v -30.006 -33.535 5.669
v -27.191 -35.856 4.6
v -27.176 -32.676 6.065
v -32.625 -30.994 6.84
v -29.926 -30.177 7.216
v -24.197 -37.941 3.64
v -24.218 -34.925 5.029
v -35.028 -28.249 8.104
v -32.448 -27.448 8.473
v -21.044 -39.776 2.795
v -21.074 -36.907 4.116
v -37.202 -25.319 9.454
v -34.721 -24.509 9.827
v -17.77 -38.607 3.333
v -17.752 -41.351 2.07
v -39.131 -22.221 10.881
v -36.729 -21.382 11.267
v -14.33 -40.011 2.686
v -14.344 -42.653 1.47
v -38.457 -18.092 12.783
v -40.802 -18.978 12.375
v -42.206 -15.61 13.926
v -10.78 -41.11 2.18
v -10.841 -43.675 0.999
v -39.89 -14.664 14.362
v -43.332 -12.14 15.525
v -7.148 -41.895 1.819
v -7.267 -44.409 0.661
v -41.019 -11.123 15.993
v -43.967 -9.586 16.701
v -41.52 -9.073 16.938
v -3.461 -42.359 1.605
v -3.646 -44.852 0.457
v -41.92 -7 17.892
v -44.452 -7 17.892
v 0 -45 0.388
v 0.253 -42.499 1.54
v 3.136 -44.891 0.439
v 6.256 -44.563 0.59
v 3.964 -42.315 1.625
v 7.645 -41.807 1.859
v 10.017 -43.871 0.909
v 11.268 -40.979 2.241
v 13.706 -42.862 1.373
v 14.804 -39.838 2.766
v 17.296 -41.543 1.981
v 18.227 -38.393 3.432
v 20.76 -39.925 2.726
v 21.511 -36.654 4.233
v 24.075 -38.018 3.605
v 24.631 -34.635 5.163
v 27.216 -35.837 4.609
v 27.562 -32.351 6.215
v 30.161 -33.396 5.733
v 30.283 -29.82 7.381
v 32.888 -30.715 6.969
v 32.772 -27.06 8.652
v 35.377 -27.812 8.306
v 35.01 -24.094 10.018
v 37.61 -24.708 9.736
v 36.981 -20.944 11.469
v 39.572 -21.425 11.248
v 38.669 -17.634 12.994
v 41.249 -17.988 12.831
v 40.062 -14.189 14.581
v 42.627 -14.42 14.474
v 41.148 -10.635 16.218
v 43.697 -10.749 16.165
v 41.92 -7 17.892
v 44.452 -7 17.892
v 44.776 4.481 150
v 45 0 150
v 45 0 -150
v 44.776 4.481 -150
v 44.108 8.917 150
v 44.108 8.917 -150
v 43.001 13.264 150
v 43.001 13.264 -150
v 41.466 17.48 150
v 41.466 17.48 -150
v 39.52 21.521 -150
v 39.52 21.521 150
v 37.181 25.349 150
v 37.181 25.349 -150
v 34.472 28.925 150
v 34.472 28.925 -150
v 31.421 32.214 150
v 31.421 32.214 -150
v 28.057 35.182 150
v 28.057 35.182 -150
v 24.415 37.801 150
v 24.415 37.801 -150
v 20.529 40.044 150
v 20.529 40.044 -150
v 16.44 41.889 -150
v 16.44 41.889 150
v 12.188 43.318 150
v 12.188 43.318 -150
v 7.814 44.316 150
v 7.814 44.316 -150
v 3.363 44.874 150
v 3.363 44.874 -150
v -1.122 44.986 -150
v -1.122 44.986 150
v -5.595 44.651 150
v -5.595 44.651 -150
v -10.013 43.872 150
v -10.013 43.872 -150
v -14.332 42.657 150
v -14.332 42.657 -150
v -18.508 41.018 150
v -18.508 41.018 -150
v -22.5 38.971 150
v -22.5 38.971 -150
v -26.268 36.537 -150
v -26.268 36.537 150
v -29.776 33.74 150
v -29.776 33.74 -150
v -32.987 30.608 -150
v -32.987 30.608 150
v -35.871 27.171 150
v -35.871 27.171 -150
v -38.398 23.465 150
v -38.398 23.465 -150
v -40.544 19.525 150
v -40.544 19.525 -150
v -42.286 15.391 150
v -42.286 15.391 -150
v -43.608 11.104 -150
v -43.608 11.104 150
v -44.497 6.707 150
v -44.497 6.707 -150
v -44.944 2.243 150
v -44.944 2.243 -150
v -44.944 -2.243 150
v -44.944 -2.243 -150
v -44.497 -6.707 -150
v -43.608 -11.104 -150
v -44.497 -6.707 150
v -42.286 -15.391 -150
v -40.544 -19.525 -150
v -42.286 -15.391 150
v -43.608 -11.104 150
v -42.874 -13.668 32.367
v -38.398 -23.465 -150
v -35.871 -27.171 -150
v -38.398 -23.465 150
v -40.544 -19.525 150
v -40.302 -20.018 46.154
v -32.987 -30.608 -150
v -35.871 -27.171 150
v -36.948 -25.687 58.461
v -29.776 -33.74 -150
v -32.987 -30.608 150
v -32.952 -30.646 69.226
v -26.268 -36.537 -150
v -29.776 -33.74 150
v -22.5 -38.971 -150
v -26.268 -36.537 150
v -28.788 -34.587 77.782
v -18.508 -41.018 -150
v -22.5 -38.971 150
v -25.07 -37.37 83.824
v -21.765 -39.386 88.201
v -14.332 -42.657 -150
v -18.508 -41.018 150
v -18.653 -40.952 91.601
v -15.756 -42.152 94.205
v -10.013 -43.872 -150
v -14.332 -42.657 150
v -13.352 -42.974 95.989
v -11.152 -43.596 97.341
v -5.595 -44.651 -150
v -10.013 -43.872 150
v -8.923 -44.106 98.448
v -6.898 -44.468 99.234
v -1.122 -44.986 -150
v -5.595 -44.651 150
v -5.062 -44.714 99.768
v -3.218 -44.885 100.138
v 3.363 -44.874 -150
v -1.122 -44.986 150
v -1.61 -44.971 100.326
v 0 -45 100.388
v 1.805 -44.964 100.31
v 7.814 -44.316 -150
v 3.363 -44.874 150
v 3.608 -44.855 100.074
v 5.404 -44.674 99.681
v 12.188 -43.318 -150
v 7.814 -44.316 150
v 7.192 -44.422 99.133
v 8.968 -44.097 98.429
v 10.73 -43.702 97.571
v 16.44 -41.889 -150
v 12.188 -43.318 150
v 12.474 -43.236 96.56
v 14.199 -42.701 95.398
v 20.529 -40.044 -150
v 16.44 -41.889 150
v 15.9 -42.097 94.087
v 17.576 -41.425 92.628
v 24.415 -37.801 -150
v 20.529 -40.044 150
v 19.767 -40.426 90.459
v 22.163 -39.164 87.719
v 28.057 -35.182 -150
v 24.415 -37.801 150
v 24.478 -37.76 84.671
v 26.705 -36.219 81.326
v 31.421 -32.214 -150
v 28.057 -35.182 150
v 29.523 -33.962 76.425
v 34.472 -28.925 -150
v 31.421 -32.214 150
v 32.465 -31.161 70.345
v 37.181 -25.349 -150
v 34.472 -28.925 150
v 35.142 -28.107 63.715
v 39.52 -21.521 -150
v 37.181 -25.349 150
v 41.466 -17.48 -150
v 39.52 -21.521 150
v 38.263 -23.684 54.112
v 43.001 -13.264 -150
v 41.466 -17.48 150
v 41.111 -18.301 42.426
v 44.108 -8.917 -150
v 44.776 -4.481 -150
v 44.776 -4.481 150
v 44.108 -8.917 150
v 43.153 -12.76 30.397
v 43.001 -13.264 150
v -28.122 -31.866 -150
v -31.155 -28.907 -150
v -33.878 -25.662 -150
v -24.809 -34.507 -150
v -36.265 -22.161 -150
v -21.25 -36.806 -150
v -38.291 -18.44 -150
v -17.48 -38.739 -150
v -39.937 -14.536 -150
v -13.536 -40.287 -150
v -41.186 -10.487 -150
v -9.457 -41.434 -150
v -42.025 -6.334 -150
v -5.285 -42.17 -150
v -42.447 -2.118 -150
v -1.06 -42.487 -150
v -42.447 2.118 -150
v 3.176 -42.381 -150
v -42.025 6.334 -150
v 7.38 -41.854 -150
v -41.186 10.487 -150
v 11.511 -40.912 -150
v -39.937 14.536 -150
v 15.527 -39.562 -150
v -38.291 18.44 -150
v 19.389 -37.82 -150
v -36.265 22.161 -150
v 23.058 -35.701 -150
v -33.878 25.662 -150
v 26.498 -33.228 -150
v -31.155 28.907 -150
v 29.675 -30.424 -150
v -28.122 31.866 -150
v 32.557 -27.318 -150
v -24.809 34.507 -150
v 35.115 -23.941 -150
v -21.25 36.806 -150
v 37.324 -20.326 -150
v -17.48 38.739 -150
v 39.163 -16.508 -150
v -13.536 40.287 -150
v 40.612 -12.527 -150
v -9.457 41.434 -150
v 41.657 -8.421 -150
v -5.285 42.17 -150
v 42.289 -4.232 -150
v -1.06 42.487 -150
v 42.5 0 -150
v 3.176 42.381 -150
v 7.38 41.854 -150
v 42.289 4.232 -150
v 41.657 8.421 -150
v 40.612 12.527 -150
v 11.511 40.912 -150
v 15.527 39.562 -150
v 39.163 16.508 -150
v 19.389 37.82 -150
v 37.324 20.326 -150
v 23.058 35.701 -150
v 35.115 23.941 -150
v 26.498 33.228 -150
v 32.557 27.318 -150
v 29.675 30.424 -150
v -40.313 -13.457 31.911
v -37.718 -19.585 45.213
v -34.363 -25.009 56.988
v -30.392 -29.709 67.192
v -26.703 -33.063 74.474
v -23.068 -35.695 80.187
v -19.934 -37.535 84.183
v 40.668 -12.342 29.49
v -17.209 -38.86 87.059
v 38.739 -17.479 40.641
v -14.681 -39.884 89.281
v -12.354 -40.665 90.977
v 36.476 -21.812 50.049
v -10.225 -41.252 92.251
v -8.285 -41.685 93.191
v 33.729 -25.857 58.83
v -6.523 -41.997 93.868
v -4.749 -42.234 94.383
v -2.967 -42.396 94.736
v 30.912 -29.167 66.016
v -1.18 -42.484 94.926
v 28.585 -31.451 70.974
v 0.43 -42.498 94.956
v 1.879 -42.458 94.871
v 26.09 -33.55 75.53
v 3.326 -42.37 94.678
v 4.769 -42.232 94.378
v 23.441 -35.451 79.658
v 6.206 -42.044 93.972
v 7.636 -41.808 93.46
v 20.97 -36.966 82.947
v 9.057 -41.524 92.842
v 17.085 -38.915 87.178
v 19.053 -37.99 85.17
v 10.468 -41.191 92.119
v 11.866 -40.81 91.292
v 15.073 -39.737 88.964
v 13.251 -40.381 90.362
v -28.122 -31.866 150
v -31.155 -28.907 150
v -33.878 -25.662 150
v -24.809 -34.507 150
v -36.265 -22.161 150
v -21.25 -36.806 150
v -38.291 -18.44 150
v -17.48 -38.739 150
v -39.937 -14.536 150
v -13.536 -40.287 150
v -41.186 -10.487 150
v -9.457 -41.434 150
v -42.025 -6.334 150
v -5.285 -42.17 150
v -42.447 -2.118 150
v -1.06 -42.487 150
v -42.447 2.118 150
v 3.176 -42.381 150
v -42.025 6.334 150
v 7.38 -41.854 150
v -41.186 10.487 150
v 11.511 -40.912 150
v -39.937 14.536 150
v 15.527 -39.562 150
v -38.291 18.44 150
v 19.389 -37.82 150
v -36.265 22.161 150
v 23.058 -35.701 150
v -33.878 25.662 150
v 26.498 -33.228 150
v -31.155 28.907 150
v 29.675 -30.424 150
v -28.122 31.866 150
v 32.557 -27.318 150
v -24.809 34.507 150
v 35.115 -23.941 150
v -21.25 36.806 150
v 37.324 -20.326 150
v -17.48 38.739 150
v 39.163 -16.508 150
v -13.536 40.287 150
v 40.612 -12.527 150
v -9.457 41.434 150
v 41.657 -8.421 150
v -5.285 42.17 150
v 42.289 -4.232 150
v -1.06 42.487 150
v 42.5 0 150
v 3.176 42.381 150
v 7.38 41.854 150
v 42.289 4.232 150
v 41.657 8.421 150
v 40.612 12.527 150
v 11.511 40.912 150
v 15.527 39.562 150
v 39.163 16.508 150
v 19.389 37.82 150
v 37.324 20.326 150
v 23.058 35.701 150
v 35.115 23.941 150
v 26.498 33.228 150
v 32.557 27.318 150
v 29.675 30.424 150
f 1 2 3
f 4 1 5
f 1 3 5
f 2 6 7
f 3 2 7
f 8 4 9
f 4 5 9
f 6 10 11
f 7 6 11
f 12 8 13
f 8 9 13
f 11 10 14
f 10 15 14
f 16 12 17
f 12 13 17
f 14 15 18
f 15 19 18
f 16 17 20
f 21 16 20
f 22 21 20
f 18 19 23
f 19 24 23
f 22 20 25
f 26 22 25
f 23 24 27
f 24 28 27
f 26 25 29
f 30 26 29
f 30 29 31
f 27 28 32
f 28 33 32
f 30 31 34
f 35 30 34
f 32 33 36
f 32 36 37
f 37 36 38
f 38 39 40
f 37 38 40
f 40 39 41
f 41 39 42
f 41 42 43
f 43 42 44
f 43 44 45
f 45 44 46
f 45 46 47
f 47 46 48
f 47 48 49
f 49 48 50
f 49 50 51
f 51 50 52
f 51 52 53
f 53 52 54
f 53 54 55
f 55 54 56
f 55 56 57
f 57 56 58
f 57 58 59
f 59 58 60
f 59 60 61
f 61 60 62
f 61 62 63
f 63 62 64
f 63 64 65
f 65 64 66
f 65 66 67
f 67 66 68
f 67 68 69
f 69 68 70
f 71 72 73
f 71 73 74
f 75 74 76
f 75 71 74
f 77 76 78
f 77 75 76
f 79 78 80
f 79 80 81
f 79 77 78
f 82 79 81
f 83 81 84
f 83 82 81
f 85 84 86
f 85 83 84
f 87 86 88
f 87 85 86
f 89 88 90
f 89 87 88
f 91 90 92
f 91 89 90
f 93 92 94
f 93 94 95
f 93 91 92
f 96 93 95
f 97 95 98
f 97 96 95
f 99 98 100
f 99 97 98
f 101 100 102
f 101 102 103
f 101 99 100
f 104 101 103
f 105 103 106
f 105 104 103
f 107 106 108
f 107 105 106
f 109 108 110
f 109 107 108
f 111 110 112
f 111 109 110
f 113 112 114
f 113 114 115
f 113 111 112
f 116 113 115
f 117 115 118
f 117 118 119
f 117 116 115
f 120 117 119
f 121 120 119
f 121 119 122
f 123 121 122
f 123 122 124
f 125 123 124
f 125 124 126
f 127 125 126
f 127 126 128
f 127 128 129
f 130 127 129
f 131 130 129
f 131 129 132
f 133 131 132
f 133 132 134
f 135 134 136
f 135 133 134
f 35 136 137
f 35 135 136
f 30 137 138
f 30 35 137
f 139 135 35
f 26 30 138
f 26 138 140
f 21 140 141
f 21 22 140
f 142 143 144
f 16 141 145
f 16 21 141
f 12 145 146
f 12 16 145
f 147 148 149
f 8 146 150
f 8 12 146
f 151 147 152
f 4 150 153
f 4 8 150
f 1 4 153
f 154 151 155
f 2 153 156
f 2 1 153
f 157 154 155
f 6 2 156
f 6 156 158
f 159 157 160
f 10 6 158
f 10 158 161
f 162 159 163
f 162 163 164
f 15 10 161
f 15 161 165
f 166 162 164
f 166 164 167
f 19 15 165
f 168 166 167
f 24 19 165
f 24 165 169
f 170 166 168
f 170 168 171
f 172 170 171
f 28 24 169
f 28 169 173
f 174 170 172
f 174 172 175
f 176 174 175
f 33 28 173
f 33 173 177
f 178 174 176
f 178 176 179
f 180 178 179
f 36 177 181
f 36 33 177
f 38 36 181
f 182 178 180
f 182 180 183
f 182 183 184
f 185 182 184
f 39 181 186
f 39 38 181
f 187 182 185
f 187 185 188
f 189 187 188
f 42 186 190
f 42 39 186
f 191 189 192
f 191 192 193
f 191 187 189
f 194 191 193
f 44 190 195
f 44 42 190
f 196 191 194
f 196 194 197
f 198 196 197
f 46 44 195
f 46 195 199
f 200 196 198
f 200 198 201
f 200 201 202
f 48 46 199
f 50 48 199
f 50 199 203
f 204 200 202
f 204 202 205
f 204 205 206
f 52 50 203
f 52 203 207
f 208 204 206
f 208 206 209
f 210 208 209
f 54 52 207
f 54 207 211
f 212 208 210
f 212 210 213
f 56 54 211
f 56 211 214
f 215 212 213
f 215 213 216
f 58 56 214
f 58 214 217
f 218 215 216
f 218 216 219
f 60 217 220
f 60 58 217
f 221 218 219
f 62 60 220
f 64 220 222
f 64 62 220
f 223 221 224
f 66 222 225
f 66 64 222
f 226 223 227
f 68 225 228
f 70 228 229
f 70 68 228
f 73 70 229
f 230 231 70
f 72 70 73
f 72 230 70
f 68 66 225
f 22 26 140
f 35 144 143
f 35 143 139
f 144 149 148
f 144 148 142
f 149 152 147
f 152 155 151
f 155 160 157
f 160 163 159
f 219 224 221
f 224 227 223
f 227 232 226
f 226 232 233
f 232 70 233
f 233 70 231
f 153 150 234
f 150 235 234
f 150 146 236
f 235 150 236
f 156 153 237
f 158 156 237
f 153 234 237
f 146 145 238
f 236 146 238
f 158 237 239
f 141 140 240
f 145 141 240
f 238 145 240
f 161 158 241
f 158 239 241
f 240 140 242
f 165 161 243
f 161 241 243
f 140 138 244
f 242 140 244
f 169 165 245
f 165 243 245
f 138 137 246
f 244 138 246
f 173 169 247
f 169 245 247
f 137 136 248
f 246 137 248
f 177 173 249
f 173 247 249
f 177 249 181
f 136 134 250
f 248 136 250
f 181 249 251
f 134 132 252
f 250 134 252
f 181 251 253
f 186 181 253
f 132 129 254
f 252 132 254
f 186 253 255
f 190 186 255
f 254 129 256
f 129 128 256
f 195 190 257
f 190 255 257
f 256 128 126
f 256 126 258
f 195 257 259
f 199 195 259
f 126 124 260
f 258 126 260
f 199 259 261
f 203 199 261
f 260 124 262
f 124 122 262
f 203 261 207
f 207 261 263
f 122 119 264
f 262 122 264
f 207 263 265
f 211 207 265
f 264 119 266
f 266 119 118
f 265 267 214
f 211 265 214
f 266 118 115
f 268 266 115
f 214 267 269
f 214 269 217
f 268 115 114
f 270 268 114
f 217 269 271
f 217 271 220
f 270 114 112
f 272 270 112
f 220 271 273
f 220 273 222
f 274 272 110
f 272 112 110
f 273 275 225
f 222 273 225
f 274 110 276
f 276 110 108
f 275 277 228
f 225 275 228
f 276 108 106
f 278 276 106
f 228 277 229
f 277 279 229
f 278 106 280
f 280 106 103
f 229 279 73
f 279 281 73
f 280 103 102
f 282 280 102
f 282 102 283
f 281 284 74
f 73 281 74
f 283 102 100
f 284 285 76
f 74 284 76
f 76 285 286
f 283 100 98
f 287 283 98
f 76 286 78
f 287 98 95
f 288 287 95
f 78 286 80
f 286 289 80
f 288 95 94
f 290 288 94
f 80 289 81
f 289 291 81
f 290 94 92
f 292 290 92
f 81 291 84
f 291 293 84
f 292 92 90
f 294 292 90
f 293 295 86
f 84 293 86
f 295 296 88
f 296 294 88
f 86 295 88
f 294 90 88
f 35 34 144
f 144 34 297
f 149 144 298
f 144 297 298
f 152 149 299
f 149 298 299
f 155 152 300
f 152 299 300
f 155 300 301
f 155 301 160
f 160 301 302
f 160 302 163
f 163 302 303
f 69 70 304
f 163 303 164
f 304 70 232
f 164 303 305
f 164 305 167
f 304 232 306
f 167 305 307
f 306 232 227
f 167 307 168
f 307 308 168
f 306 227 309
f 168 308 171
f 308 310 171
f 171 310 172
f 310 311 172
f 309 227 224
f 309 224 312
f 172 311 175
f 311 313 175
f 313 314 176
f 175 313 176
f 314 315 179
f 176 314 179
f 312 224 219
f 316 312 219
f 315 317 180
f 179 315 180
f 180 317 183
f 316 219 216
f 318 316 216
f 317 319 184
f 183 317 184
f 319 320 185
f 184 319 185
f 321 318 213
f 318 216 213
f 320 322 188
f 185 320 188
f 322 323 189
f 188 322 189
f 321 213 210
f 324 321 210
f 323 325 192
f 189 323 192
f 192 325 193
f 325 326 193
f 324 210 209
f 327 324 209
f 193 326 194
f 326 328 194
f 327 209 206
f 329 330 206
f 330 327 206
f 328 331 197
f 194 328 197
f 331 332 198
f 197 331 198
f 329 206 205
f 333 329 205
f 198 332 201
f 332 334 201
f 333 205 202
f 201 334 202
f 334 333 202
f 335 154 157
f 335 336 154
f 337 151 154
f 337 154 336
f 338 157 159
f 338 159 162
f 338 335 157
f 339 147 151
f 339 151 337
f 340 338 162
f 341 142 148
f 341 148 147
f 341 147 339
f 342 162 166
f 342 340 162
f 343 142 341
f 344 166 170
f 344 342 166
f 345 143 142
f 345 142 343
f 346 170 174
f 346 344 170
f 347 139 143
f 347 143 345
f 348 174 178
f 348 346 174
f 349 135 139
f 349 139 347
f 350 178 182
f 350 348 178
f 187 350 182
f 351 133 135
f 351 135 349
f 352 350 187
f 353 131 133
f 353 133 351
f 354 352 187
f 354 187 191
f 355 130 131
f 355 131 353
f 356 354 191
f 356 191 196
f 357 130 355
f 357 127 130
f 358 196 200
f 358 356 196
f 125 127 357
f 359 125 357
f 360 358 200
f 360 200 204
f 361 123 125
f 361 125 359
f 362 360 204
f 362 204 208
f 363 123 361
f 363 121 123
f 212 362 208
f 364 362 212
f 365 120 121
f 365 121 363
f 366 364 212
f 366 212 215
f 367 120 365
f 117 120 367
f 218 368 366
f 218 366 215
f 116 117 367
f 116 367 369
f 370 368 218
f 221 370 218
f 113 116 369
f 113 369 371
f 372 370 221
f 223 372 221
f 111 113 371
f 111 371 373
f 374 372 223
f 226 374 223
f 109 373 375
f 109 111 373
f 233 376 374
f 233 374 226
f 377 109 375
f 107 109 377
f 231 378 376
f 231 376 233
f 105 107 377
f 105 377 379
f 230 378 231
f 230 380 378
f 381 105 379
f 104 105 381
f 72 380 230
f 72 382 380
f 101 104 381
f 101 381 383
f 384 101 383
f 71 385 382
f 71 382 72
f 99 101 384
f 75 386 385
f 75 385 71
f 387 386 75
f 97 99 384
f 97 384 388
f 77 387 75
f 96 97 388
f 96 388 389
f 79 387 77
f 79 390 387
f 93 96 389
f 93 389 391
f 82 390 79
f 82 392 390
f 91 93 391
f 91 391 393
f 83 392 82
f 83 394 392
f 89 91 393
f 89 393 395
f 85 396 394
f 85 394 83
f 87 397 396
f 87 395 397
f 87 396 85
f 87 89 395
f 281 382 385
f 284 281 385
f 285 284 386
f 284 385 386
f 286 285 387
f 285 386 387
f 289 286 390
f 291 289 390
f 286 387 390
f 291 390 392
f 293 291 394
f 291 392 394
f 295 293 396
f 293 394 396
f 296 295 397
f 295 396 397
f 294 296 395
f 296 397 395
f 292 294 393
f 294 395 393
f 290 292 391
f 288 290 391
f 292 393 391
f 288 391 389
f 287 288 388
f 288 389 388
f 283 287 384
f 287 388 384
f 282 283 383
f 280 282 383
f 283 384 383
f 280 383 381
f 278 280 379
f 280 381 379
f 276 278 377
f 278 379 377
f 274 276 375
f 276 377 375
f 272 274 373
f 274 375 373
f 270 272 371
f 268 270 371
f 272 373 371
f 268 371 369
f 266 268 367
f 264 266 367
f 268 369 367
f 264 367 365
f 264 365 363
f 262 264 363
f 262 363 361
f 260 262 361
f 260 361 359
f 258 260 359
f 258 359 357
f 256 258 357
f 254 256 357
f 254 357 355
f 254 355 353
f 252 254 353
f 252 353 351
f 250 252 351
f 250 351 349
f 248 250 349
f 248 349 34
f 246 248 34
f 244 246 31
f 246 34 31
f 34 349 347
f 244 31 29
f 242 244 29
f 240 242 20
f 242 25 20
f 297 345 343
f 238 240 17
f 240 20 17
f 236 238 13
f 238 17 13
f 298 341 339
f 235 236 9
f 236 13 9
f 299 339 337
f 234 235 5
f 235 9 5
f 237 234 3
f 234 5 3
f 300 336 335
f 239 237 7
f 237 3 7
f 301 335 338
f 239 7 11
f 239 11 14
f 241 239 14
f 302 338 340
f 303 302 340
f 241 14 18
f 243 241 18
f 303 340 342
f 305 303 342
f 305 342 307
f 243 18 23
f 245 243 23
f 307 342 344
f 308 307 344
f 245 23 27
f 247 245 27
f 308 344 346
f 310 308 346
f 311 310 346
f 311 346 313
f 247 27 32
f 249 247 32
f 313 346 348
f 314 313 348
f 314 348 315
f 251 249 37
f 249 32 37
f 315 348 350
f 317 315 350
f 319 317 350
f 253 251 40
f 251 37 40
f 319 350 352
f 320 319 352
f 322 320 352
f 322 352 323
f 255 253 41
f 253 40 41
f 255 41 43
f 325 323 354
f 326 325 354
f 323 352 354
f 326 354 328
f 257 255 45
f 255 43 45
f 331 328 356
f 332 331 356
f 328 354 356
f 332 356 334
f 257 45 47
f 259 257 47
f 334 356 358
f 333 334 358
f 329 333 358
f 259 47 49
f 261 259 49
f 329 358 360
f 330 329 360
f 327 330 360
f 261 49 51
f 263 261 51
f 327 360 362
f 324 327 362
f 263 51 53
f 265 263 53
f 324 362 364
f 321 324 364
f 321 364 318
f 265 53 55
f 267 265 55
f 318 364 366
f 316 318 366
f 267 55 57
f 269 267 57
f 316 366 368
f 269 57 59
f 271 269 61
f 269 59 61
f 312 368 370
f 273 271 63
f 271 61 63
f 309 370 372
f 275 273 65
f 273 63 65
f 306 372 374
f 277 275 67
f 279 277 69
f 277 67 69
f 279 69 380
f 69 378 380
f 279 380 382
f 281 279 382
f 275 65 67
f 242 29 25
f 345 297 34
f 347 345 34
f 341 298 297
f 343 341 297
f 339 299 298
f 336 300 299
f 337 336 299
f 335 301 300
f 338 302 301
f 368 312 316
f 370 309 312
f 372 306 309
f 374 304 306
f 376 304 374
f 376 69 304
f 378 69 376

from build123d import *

# Parameters (mm, degrees)
F0_R     = 45
F1_DEPTH = 150
F2_T     = -2.5
F4_DEPTH = 50


with BuildPart() as f1:
    # F0 (on Top) → F1 (new body, symmetric)
    with BuildSketch(Plane.XY):
        Circle(F0_R)
    extrude(amount=F1_DEPTH, both=True)

    # F2
    f2_openings = [f1.faces().sort_by_distance(p)[0] for p in [
        (0, 0, 150),
        (0, 0, -150),
    ]]
    offset(amount=F2_T, openings=f2_openings)

    # F3 (on Right) → F4 (cut, symmetric)
    with BuildSketch(Plane.YZ):
        Polygon((-45, 100.388468), (-45, 0.388468), (-7, 17.892315), align=None)
    extrude(amount=F4_DEPTH, both=True, mode=Mode.SUBTRACT)


solid = f1.part
